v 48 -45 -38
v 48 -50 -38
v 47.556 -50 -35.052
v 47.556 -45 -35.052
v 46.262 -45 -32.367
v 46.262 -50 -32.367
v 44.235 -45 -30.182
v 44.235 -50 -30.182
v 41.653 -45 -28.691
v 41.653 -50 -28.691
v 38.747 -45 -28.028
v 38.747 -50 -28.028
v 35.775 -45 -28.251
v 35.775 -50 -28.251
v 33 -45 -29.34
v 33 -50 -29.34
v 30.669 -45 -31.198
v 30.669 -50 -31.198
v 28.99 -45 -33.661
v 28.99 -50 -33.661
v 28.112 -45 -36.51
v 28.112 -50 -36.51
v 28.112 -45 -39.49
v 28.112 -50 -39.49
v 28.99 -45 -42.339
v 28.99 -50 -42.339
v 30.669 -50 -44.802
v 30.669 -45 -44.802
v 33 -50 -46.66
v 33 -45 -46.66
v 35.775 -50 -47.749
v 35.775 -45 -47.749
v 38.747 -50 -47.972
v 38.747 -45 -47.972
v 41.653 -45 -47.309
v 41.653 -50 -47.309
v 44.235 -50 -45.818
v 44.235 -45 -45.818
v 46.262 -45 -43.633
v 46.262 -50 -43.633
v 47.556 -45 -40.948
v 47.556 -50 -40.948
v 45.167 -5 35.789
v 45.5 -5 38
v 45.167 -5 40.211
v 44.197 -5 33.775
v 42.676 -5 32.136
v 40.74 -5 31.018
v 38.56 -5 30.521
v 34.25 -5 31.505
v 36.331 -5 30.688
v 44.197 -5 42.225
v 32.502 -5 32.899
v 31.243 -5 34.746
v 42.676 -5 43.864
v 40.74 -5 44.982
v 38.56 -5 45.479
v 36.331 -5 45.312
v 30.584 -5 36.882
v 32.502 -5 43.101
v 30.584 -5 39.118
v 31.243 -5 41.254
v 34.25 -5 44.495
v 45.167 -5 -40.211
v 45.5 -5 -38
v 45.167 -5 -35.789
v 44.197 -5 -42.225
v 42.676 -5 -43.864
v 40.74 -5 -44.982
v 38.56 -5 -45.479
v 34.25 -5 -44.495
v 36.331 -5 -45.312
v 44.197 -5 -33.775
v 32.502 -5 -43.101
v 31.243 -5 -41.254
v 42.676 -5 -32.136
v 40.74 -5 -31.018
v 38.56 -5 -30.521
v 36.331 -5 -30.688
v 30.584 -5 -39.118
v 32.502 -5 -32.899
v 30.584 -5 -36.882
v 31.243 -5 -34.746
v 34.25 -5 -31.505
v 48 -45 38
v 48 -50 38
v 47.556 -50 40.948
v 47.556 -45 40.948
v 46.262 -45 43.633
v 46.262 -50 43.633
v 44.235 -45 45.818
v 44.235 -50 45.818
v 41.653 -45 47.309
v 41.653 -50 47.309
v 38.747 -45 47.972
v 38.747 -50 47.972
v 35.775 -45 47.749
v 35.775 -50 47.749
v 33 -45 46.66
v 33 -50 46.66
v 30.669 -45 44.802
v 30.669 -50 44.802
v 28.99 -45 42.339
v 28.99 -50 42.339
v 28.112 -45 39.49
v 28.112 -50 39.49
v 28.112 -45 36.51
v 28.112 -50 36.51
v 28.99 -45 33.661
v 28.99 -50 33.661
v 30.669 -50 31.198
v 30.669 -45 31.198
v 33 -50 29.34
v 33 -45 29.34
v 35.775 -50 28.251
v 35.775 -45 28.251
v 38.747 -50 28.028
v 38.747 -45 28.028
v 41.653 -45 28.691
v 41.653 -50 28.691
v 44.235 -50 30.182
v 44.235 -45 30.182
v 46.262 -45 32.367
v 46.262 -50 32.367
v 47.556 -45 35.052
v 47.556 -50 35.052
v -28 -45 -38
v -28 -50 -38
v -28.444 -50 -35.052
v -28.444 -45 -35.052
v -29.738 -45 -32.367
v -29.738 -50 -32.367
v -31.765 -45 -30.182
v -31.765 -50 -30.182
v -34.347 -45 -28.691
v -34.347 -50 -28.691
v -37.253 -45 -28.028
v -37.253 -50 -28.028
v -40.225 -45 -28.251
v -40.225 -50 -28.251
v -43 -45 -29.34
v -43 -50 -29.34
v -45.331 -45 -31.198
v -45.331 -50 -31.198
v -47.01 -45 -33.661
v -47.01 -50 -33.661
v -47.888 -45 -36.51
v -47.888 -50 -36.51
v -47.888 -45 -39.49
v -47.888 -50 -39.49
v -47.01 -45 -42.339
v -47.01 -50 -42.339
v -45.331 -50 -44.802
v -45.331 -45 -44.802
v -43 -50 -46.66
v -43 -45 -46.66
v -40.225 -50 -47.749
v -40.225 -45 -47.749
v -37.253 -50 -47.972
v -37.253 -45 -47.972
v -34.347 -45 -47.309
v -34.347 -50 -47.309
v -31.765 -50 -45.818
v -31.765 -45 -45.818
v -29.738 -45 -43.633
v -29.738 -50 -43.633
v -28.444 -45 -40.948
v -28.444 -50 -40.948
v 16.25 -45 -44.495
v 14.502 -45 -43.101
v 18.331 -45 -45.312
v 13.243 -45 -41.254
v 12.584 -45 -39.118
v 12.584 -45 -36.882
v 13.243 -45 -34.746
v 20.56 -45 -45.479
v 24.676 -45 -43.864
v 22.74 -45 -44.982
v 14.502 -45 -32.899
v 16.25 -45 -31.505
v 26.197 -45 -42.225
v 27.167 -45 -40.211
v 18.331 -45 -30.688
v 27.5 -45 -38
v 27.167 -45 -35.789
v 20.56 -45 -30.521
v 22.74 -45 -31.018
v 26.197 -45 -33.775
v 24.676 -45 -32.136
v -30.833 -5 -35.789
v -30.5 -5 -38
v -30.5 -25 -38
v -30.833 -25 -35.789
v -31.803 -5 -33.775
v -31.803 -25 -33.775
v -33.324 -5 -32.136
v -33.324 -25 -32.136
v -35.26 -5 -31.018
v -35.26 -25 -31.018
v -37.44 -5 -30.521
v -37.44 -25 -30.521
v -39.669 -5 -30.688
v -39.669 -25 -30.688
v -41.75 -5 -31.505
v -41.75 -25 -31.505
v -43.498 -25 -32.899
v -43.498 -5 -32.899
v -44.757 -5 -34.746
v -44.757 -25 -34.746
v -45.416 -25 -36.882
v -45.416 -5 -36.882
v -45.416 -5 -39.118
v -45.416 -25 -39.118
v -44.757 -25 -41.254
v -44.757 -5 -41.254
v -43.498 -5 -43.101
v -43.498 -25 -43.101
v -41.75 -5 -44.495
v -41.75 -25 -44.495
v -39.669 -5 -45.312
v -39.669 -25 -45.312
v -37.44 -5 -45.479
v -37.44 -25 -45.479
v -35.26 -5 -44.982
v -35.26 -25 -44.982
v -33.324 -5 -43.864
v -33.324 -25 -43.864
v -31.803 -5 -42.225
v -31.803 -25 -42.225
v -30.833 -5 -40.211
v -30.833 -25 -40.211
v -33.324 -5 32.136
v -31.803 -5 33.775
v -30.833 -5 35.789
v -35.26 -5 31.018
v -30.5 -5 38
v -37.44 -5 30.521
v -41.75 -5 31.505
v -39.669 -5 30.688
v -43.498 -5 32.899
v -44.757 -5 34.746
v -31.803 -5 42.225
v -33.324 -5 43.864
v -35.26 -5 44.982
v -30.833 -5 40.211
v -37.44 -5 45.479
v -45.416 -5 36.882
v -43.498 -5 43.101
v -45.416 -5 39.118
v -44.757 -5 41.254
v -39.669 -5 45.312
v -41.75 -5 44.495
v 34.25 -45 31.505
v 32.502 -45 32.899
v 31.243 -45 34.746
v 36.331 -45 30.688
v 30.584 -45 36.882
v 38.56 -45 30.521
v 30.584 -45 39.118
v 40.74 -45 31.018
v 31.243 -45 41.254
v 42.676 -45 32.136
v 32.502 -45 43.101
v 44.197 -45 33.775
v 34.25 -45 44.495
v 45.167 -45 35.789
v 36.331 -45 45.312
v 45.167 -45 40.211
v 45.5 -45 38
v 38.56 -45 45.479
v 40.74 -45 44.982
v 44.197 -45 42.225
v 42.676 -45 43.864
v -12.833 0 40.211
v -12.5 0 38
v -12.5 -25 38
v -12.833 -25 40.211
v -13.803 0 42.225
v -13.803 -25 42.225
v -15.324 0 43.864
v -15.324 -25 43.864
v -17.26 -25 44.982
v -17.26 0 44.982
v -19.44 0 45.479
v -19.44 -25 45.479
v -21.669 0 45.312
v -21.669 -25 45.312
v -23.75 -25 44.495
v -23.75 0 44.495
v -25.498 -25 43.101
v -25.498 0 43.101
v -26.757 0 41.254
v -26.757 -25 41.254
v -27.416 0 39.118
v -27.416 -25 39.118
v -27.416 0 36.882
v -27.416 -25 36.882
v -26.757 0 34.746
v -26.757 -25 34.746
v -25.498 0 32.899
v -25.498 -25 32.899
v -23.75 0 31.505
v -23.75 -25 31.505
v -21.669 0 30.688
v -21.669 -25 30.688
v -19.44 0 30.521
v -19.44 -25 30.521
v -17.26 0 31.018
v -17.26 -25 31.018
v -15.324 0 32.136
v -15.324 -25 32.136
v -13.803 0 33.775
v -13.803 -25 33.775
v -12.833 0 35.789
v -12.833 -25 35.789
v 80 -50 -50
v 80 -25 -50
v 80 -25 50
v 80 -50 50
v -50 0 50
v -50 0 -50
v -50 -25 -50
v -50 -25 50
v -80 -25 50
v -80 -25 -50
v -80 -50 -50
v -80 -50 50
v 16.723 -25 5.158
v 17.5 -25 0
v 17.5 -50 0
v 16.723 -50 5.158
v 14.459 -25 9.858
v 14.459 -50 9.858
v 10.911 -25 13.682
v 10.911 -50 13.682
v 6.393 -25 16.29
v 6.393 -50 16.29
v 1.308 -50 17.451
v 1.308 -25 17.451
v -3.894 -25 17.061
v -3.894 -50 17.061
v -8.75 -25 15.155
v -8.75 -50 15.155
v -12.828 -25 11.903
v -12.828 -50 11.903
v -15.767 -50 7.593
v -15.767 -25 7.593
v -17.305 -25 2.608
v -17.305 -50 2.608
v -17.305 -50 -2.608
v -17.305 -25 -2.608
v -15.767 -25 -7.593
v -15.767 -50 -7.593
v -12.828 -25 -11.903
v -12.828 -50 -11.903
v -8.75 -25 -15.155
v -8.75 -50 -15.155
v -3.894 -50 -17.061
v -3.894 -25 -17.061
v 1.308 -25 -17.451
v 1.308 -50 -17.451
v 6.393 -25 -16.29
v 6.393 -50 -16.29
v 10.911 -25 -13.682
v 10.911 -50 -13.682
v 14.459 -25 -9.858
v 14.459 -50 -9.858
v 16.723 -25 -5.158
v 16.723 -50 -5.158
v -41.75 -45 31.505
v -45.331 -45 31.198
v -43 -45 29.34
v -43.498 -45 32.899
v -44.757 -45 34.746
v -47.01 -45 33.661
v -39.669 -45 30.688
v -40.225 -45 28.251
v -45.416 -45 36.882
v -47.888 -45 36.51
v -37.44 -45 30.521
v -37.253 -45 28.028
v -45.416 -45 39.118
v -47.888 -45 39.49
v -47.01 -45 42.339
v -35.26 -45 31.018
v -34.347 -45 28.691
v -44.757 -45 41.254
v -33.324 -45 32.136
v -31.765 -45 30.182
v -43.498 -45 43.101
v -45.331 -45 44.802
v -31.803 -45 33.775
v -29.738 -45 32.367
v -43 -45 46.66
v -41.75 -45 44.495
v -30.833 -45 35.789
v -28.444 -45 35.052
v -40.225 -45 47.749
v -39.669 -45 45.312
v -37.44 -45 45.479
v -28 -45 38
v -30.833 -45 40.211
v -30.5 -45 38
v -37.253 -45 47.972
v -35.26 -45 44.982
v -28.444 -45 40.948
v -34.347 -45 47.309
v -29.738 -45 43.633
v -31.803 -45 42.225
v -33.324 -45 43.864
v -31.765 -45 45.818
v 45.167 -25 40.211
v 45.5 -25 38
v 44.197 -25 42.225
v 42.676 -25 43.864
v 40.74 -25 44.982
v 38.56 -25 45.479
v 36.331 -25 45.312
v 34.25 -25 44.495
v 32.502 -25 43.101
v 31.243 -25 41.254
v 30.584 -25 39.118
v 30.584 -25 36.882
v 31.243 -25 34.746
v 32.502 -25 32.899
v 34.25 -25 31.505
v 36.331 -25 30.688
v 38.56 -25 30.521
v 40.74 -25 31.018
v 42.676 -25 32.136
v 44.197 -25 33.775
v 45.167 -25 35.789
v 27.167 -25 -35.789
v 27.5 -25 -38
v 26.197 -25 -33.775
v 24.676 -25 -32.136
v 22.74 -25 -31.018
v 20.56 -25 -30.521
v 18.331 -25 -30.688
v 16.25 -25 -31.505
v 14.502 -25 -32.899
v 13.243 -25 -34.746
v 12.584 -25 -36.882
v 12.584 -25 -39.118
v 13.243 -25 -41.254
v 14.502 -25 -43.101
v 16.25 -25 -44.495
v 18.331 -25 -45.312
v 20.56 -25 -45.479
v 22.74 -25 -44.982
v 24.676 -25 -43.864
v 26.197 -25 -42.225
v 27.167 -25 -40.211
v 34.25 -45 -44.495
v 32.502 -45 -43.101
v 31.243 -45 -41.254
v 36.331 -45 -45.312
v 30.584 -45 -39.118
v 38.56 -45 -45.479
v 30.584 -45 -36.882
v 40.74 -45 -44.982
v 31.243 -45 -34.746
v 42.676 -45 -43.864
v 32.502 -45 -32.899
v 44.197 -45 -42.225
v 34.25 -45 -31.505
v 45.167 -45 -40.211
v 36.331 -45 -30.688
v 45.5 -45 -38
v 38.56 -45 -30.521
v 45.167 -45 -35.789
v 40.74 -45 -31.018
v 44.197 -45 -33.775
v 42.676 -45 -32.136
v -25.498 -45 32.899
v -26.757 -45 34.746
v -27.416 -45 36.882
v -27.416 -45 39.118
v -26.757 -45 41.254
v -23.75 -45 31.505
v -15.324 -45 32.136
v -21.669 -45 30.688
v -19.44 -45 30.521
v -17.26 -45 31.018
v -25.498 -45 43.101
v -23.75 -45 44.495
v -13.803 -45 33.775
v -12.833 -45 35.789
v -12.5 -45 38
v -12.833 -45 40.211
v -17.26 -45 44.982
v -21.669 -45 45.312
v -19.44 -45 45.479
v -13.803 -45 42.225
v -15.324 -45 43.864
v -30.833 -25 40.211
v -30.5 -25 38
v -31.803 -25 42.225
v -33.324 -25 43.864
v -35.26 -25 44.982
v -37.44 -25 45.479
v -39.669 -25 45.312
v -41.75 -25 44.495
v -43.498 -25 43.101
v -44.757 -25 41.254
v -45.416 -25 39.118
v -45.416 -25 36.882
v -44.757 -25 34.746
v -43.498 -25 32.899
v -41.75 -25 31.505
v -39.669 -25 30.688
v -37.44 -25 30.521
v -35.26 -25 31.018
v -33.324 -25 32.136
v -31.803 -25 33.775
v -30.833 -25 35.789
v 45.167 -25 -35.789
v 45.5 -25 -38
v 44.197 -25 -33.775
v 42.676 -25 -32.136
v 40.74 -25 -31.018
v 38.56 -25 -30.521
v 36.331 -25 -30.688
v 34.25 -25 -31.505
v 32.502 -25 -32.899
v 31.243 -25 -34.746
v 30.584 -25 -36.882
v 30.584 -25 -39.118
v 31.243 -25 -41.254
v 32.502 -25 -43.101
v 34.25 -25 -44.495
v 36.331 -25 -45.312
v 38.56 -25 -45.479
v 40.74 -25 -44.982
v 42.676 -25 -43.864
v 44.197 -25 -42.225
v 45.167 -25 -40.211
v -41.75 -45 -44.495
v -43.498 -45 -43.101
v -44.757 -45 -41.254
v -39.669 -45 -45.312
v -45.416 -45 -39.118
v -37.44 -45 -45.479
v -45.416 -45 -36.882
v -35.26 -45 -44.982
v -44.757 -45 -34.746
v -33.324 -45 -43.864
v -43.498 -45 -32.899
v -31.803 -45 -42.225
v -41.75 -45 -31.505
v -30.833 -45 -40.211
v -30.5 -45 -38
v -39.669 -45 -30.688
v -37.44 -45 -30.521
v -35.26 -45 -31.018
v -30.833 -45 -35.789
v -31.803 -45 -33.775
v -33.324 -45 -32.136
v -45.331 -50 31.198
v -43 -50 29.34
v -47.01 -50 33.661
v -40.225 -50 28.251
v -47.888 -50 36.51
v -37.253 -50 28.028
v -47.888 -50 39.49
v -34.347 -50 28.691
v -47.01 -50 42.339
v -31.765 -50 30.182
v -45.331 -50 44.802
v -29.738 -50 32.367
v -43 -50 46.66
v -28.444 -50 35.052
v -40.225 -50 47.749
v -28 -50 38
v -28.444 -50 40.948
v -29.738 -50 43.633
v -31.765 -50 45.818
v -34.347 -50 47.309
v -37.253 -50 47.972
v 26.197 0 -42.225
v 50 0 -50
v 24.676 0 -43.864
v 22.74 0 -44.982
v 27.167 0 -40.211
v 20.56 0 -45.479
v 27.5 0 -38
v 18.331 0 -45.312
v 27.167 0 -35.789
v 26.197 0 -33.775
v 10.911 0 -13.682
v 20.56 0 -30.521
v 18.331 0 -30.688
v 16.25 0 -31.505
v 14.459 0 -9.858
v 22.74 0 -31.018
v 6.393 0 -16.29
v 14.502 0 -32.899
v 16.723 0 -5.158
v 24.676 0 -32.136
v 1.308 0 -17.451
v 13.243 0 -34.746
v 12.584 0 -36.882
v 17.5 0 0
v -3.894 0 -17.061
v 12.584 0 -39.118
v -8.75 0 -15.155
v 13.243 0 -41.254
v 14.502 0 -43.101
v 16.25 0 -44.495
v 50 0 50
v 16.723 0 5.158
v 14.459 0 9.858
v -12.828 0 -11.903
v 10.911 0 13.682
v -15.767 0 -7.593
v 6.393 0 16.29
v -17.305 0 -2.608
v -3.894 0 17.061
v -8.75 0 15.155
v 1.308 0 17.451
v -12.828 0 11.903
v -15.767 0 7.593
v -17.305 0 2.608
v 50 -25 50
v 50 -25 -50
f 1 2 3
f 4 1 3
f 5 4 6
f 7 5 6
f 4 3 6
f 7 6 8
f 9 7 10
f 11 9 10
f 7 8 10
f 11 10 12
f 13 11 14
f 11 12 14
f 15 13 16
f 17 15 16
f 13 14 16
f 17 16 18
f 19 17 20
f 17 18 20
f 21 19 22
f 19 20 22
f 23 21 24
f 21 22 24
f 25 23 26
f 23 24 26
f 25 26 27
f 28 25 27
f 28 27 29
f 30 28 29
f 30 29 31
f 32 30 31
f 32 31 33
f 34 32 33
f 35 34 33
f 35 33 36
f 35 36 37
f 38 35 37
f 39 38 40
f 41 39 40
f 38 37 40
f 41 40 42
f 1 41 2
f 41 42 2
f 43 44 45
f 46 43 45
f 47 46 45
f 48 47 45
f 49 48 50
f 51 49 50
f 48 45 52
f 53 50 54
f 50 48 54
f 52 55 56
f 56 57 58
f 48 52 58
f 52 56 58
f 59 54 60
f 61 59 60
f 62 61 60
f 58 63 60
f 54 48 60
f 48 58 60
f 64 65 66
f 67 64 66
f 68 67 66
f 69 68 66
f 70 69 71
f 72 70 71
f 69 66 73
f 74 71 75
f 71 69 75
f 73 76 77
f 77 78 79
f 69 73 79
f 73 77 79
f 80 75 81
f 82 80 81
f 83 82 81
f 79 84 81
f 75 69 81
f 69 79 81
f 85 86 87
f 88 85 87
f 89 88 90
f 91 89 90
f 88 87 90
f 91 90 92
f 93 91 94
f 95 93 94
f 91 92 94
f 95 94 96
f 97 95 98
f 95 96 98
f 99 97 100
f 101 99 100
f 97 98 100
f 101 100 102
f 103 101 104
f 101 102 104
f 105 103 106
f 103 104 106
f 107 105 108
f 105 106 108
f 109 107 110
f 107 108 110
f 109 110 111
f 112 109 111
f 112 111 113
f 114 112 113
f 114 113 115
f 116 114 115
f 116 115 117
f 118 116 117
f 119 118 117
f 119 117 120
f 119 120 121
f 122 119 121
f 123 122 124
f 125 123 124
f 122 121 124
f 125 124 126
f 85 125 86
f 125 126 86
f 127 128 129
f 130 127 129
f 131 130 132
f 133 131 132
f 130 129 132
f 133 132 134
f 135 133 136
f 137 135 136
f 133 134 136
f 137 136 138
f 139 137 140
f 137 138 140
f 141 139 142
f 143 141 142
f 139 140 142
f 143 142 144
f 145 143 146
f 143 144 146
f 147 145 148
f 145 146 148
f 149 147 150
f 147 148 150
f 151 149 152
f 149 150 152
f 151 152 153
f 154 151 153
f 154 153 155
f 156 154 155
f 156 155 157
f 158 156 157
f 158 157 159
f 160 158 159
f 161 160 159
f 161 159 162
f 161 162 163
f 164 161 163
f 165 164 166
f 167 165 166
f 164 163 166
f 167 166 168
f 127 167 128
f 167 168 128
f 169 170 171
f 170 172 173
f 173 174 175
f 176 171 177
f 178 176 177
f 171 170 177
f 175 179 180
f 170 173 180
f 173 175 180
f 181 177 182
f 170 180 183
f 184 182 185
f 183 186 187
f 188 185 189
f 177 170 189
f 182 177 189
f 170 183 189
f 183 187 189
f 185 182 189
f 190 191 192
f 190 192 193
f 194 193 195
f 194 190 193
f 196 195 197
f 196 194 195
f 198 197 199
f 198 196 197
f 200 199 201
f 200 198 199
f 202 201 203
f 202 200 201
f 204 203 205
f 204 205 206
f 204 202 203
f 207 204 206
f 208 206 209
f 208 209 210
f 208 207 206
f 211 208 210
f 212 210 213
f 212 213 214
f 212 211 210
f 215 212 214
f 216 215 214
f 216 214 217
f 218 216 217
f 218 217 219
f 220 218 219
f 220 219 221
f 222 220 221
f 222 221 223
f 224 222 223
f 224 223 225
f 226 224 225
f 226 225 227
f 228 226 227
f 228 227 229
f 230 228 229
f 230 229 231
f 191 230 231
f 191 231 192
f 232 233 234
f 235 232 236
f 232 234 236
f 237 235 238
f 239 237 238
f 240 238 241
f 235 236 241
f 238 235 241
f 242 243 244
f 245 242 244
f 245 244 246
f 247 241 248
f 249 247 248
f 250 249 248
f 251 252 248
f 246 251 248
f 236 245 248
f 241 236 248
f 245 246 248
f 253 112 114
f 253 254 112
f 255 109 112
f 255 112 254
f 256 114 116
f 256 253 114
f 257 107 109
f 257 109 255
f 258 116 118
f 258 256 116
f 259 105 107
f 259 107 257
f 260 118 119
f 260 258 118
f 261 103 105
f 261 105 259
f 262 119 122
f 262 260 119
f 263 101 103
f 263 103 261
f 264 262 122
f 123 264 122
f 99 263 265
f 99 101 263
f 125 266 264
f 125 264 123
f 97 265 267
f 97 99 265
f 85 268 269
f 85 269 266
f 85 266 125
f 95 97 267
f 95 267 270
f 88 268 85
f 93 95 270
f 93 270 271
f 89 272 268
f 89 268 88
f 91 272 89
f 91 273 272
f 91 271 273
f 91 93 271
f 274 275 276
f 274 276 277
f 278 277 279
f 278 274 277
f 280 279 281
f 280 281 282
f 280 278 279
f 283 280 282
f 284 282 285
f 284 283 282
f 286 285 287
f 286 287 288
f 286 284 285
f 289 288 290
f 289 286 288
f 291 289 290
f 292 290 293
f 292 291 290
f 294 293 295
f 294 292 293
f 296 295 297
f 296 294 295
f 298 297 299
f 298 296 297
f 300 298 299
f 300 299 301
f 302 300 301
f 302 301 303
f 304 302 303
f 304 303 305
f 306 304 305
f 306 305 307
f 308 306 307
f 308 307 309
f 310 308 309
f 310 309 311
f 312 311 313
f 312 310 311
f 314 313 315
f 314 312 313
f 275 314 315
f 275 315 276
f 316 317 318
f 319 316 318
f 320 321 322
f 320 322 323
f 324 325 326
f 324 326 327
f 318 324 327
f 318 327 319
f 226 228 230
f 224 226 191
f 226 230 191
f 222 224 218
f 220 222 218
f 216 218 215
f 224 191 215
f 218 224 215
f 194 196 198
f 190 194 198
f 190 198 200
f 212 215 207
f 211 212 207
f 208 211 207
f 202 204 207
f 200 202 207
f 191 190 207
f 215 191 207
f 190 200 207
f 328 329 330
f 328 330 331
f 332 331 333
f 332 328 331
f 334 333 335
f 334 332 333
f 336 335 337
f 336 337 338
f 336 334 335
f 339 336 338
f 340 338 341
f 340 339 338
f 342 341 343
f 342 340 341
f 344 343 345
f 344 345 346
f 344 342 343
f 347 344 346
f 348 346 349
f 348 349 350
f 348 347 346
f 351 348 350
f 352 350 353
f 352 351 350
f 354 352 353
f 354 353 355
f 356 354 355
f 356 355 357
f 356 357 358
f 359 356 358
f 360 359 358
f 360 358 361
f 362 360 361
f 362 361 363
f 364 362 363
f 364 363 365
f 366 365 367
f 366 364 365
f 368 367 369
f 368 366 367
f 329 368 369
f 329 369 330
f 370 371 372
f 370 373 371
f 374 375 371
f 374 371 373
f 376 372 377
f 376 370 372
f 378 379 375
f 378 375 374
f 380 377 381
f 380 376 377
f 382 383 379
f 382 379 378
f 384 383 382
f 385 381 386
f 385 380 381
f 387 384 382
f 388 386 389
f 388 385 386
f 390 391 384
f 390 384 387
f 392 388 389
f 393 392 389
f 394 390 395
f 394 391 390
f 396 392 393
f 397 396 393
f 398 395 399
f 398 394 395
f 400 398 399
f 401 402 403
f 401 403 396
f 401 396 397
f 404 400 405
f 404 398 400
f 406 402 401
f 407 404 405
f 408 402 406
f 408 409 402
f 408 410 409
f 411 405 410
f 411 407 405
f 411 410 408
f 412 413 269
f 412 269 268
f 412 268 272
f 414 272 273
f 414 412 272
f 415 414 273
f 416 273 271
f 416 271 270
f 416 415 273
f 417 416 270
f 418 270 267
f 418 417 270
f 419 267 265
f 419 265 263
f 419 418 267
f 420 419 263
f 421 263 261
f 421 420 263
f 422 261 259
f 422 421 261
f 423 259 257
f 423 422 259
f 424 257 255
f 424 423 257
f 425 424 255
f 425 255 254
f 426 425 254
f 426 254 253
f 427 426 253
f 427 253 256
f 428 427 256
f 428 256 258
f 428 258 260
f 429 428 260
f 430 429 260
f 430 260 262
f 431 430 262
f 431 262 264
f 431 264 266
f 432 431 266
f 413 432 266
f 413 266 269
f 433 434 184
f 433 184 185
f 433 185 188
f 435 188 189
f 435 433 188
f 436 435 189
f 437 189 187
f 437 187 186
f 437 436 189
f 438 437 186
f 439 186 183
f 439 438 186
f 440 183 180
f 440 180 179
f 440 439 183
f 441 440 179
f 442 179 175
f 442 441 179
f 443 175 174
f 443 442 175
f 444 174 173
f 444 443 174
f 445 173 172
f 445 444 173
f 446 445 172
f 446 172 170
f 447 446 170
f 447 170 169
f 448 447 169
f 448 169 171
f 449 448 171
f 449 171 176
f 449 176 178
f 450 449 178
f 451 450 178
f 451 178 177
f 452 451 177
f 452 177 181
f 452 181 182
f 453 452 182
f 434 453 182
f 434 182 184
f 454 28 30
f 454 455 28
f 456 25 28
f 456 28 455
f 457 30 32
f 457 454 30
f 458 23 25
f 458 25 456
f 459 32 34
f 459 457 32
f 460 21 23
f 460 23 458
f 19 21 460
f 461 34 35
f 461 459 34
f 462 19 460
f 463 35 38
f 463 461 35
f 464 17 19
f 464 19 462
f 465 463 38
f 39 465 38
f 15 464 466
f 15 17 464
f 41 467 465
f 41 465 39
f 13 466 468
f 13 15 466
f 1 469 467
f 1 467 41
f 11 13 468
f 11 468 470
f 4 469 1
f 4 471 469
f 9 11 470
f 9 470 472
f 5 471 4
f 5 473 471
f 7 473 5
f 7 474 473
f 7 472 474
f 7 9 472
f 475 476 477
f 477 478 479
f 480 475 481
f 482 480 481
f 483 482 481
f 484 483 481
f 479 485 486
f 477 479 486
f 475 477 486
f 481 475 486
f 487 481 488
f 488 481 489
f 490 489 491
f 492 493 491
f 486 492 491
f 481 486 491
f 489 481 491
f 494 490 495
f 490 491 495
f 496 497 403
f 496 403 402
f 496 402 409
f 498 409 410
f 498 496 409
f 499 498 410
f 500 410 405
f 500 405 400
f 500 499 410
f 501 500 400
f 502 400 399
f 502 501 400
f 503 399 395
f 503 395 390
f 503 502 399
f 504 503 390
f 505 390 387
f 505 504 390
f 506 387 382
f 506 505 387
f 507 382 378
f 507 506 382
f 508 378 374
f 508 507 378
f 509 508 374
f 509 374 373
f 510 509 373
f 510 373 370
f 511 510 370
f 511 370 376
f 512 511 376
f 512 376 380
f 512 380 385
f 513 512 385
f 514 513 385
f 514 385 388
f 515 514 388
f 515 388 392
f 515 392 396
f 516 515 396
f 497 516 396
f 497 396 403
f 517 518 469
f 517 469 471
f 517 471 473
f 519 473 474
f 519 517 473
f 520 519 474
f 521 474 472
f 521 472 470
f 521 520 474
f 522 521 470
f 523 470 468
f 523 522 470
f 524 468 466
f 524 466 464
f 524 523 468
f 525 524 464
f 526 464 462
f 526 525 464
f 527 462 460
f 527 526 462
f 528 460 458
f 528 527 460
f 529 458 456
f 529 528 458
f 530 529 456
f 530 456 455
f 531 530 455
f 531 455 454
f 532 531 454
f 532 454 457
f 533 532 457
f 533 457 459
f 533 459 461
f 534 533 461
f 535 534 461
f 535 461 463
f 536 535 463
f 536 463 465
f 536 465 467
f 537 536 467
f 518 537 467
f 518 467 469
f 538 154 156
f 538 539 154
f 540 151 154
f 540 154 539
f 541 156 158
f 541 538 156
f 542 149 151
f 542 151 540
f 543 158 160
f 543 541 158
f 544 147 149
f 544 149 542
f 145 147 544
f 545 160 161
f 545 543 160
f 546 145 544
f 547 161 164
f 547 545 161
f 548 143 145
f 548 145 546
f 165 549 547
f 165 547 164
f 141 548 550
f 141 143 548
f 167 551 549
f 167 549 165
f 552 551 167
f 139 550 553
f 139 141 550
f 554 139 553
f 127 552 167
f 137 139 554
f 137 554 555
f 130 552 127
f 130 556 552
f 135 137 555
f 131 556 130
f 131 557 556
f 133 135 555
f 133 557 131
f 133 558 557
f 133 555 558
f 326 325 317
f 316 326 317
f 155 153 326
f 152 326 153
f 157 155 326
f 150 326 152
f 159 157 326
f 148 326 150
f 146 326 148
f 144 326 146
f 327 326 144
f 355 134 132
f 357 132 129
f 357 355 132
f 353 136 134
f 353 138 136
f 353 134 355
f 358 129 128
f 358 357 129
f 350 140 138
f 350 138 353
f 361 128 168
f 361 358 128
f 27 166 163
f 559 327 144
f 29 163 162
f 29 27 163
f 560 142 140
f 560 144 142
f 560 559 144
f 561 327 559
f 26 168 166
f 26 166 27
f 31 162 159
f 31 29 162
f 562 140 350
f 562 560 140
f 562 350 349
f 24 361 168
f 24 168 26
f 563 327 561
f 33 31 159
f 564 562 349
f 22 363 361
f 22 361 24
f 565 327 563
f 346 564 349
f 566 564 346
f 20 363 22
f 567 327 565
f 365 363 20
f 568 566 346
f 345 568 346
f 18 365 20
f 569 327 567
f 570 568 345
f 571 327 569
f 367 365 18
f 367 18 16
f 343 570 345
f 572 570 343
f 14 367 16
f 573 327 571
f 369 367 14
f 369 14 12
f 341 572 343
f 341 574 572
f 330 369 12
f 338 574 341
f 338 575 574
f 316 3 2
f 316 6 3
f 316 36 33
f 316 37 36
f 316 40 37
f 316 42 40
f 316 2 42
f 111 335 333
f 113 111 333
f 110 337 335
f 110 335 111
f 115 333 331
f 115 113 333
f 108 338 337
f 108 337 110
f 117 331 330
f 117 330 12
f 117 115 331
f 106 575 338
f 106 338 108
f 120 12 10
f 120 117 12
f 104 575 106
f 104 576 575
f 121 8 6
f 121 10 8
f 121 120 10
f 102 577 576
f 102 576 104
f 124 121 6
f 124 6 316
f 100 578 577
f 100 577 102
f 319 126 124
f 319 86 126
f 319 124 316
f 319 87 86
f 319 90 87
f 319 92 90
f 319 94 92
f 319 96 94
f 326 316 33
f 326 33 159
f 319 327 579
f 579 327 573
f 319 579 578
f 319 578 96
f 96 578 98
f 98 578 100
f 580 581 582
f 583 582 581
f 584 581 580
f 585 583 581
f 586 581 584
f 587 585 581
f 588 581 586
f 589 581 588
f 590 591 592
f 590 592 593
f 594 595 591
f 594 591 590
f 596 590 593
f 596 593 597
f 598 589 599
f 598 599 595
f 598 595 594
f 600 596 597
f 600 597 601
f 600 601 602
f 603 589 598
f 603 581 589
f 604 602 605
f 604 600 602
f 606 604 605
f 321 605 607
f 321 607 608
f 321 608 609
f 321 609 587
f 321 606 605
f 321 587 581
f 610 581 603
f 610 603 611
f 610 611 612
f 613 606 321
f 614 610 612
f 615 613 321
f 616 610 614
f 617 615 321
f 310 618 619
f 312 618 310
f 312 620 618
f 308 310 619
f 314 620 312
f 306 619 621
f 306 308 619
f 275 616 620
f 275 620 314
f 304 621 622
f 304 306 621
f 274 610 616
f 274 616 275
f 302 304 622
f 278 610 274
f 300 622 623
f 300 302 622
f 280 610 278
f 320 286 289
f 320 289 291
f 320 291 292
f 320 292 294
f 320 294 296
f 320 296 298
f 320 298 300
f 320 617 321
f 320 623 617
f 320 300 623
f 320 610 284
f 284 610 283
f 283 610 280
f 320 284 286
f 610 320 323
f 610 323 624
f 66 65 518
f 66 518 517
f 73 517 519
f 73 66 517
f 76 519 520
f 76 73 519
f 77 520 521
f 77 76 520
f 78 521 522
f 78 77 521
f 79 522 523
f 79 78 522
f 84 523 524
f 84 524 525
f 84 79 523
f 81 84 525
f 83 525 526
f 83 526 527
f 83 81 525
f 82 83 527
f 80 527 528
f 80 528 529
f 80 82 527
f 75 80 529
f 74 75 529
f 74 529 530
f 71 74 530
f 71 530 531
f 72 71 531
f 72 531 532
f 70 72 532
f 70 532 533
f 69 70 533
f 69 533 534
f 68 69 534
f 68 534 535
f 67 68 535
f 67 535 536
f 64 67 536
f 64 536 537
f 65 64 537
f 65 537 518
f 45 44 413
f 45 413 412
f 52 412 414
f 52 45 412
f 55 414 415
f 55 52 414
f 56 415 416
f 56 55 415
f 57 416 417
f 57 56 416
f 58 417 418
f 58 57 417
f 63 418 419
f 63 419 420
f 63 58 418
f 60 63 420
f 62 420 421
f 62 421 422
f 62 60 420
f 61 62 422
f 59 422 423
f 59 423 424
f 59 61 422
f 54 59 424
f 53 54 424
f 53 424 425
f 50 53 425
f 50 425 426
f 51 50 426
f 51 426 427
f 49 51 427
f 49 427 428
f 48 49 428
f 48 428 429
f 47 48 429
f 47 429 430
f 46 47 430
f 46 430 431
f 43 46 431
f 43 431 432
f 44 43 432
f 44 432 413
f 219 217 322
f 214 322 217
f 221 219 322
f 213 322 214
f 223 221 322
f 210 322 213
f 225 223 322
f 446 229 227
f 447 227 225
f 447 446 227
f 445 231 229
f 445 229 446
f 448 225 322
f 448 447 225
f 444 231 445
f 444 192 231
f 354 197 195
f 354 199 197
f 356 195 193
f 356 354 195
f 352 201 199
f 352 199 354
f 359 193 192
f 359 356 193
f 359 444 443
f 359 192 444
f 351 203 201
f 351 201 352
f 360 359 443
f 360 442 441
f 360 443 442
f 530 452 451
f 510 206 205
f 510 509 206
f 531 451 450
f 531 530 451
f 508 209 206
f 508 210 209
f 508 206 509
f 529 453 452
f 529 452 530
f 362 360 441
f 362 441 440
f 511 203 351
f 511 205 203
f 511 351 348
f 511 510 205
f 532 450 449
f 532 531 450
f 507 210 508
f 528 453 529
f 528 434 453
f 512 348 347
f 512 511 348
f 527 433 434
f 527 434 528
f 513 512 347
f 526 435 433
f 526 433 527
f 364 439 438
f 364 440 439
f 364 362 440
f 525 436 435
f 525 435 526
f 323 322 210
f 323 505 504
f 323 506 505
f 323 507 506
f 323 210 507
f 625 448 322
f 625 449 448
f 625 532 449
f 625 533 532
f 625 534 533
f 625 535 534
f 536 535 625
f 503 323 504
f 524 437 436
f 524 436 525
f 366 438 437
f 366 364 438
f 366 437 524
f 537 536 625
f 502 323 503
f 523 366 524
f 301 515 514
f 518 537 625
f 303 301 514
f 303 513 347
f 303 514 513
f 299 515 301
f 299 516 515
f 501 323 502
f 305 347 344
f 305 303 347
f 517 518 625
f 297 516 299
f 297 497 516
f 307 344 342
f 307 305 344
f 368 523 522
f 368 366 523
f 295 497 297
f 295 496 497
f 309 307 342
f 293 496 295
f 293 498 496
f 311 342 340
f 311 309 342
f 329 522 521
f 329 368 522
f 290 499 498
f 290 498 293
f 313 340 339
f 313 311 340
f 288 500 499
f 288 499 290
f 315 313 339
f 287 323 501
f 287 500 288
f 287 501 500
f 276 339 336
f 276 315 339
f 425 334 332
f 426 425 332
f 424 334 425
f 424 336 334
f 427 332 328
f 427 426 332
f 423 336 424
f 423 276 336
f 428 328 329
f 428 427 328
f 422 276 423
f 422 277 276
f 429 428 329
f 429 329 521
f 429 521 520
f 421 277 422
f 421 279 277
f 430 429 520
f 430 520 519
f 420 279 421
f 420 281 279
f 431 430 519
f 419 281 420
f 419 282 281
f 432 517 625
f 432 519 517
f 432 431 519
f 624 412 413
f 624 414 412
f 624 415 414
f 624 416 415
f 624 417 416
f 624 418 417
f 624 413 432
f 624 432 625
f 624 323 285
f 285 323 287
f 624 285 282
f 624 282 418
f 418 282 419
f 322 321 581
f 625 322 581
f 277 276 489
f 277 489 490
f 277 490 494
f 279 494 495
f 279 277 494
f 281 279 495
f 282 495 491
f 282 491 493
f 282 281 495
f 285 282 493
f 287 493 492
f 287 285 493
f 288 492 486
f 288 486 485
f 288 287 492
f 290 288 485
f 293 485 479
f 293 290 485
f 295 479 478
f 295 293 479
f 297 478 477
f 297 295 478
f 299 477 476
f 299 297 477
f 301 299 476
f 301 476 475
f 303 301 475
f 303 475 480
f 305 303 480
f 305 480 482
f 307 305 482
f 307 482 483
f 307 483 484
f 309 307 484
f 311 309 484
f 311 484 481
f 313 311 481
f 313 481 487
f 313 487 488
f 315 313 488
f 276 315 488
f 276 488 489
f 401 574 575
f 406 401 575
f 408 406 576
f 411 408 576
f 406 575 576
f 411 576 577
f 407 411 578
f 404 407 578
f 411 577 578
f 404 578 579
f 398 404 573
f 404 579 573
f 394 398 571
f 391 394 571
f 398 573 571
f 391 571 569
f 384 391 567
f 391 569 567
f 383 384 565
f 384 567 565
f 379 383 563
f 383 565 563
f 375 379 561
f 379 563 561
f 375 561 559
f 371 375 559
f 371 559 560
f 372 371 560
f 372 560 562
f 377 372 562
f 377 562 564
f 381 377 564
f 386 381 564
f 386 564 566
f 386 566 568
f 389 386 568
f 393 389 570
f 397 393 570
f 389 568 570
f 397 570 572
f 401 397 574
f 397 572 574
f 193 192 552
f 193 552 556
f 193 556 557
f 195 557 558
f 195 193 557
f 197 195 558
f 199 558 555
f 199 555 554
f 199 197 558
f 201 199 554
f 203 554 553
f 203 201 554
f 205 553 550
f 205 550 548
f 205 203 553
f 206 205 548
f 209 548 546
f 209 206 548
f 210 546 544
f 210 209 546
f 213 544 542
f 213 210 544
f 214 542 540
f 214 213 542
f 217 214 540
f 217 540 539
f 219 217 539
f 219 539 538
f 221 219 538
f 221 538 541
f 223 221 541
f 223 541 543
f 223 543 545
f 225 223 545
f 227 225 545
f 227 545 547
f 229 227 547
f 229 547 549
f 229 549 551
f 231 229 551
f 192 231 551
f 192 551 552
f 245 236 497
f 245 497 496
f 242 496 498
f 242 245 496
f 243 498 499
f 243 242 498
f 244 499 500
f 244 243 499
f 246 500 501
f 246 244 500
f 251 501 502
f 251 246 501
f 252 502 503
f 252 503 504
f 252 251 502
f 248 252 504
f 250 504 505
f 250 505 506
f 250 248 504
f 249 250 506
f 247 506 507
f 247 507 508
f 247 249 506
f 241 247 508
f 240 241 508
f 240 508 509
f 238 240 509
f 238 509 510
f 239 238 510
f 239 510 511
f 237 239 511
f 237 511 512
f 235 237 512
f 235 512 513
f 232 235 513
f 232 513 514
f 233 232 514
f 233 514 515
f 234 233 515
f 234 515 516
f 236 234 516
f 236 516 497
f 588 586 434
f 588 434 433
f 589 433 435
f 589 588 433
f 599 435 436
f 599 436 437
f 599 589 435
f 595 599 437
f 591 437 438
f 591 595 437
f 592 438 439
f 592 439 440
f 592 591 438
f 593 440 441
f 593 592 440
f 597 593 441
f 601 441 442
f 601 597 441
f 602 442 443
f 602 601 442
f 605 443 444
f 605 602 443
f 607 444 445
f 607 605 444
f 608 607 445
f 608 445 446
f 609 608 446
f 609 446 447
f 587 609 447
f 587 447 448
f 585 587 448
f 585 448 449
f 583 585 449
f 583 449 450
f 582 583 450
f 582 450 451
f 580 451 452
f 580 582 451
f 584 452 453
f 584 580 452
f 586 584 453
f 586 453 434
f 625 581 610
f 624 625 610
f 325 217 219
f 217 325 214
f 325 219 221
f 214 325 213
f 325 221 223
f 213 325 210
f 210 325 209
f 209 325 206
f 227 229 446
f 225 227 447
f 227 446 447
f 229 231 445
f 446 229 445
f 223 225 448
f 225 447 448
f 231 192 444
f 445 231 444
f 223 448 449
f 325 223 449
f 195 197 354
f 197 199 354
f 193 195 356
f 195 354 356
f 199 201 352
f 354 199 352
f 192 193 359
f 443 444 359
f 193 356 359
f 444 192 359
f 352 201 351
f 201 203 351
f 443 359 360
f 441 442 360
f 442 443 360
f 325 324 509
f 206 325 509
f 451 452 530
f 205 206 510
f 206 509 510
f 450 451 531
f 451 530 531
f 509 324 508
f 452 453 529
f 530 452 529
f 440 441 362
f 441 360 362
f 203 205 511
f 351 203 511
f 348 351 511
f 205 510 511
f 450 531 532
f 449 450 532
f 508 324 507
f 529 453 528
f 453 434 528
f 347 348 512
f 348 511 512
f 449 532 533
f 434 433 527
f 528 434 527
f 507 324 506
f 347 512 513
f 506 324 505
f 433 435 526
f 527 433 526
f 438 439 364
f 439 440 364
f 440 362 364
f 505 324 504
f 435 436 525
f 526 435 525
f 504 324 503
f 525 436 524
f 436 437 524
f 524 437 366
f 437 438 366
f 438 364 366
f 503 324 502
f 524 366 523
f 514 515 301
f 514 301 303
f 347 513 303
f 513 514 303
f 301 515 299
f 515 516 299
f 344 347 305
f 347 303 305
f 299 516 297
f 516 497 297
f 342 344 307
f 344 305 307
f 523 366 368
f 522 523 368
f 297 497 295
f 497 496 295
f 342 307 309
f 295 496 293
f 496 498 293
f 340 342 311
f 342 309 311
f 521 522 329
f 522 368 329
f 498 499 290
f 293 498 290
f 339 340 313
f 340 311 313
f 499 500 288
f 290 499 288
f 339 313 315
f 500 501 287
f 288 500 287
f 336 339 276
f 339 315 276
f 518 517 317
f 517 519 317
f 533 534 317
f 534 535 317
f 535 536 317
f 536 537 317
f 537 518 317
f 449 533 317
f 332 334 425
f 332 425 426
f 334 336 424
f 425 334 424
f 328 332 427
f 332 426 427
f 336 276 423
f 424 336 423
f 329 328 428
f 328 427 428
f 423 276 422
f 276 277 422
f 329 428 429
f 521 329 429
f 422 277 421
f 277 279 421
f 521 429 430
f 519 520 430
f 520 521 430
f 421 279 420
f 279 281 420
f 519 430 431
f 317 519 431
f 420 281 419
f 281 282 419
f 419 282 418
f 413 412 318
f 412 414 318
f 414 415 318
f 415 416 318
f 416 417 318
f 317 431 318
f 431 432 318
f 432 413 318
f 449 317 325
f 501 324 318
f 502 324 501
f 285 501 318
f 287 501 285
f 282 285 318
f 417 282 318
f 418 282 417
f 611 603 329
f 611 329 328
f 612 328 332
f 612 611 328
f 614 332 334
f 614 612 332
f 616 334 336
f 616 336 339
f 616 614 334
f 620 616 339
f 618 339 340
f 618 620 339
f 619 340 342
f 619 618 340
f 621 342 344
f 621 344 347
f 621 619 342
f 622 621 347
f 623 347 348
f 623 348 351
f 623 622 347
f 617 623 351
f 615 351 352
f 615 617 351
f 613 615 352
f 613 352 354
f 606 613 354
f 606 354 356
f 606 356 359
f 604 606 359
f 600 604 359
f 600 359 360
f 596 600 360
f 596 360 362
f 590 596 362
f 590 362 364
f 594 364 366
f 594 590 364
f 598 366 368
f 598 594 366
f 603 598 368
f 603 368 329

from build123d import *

# Parameters (mm, degrees)
F0_W     = 100
F0_H     = 100
F0_R     = 7.5
F0_R_2   = 17.5
F1_DEPTH = 25
F2_W     = 160
F2_H     = 100
F2_R     = 7.5
F2_R_2   = 17.5
F3_DEPTH = 25
F4_R     = 7.5
F5_DEPTH = 5
F6_R     = 7.5
F7_DEPTH = 5
F8_R     = 10
F8_R_2   = 7.5
F9_DEPTH = 5


with BuildPart() as f1:
    # F0 (on Front) → F1 (new body)
    with BuildSketch(Plane.XZ):
        Rectangle(F0_W, F0_H)
        with Locations((-38, -38)):
            Circle(F0_R, mode=Mode.SUBTRACT)
        with Locations((20, -38)):
            Circle(F0_R, mode=Mode.SUBTRACT)
        with Locations((38, -38)):
            Circle(F0_R, mode=Mode.SUBTRACT)
        with Locations((-38, 38)):
            Circle(F0_R, mode=Mode.SUBTRACT)
        with Locations((-20, 38)):
            Circle(F0_R, mode=Mode.SUBTRACT)
        Circle(F0_R_2, mode=Mode.SUBTRACT)
        with Locations((38, 38)):
            Circle(F0_R, mode=Mode.SUBTRACT)
    extrude(amount=F1_DEPTH)

    # F6 (on face) → F7 (join)
    with BuildSketch(Plane(origin=(0, 0, 0), x_dir=(-1, 0, 0), z_dir=(0, 1, 0))):
        with Locations((38, -38)):
            Circle(F6_R)
        with Locations((-38, -38)):
            Circle(F6_R)
        with Locations((-38, 38)):
            Circle(F6_R)
        with Locations((38, 38)):
            Circle(F6_R)
    extrude(amount=-F7_DEPTH)


with BuildPart() as f3:
    # F2 (on face) → F3 (new body)
    with BuildSketch(Plane.XZ.offset(25)):
        Rectangle(F2_W, F2_H)
        with Locations((-38, -38)):
            Circle(F2_R, mode=Mode.SUBTRACT)
        with Locations((20, -38)):
            Circle(F2_R, mode=Mode.SUBTRACT)
        with Locations((38, -38)):
            Circle(F2_R, mode=Mode.SUBTRACT)
        with Locations((-38, 38)):
            Circle(F2_R, mode=Mode.SUBTRACT)
        with Locations((-20, 38)):
            Circle(F2_R, mode=Mode.SUBTRACT)
        Circle(F2_R_2, mode=Mode.SUBTRACT)
        with Locations((38, 38)):
            Circle(F2_R, mode=Mode.SUBTRACT)
    extrude(amount=F3_DEPTH)

    # F4 (on face) → F5 (join)
    with BuildSketch(Plane.XZ.offset(50)):
        with Locations((-20, 38)):
            Circle(F4_R)
        with Locations((20, -38)):
            Circle(F4_R)
    extrude(amount=-F5_DEPTH)

    # F8 (on face) → F9 (cut)
    with BuildSketch(Plane.XZ.offset(50)):
        with Locations((38, -38)):
            Circle(F8_R)
        with Locations((38, -38)):
            Circle(F8_R_2, mode=Mode.SUBTRACT)
        with Locations((38, 38)):
            Circle(F8_R)
        with Locations((38, 38)):
            Circle(F8_R_2, mode=Mode.SUBTRACT)
        with Locations((-38, 38)):
            Circle(F8_R)
        with Locations((-38, 38)):
            Circle(F8_R_2, mode=Mode.SUBTRACT)
        with Locations((-38, -38)):
            Circle(F8_R)
        with Locations((-38, -38)):
            Circle(F8_R_2, mode=Mode.SUBTRACT)
    extrude(amount=-F9_DEPTH, mode=Mode.SUBTRACT)


solid = Compound([f1.part, f3.part])
